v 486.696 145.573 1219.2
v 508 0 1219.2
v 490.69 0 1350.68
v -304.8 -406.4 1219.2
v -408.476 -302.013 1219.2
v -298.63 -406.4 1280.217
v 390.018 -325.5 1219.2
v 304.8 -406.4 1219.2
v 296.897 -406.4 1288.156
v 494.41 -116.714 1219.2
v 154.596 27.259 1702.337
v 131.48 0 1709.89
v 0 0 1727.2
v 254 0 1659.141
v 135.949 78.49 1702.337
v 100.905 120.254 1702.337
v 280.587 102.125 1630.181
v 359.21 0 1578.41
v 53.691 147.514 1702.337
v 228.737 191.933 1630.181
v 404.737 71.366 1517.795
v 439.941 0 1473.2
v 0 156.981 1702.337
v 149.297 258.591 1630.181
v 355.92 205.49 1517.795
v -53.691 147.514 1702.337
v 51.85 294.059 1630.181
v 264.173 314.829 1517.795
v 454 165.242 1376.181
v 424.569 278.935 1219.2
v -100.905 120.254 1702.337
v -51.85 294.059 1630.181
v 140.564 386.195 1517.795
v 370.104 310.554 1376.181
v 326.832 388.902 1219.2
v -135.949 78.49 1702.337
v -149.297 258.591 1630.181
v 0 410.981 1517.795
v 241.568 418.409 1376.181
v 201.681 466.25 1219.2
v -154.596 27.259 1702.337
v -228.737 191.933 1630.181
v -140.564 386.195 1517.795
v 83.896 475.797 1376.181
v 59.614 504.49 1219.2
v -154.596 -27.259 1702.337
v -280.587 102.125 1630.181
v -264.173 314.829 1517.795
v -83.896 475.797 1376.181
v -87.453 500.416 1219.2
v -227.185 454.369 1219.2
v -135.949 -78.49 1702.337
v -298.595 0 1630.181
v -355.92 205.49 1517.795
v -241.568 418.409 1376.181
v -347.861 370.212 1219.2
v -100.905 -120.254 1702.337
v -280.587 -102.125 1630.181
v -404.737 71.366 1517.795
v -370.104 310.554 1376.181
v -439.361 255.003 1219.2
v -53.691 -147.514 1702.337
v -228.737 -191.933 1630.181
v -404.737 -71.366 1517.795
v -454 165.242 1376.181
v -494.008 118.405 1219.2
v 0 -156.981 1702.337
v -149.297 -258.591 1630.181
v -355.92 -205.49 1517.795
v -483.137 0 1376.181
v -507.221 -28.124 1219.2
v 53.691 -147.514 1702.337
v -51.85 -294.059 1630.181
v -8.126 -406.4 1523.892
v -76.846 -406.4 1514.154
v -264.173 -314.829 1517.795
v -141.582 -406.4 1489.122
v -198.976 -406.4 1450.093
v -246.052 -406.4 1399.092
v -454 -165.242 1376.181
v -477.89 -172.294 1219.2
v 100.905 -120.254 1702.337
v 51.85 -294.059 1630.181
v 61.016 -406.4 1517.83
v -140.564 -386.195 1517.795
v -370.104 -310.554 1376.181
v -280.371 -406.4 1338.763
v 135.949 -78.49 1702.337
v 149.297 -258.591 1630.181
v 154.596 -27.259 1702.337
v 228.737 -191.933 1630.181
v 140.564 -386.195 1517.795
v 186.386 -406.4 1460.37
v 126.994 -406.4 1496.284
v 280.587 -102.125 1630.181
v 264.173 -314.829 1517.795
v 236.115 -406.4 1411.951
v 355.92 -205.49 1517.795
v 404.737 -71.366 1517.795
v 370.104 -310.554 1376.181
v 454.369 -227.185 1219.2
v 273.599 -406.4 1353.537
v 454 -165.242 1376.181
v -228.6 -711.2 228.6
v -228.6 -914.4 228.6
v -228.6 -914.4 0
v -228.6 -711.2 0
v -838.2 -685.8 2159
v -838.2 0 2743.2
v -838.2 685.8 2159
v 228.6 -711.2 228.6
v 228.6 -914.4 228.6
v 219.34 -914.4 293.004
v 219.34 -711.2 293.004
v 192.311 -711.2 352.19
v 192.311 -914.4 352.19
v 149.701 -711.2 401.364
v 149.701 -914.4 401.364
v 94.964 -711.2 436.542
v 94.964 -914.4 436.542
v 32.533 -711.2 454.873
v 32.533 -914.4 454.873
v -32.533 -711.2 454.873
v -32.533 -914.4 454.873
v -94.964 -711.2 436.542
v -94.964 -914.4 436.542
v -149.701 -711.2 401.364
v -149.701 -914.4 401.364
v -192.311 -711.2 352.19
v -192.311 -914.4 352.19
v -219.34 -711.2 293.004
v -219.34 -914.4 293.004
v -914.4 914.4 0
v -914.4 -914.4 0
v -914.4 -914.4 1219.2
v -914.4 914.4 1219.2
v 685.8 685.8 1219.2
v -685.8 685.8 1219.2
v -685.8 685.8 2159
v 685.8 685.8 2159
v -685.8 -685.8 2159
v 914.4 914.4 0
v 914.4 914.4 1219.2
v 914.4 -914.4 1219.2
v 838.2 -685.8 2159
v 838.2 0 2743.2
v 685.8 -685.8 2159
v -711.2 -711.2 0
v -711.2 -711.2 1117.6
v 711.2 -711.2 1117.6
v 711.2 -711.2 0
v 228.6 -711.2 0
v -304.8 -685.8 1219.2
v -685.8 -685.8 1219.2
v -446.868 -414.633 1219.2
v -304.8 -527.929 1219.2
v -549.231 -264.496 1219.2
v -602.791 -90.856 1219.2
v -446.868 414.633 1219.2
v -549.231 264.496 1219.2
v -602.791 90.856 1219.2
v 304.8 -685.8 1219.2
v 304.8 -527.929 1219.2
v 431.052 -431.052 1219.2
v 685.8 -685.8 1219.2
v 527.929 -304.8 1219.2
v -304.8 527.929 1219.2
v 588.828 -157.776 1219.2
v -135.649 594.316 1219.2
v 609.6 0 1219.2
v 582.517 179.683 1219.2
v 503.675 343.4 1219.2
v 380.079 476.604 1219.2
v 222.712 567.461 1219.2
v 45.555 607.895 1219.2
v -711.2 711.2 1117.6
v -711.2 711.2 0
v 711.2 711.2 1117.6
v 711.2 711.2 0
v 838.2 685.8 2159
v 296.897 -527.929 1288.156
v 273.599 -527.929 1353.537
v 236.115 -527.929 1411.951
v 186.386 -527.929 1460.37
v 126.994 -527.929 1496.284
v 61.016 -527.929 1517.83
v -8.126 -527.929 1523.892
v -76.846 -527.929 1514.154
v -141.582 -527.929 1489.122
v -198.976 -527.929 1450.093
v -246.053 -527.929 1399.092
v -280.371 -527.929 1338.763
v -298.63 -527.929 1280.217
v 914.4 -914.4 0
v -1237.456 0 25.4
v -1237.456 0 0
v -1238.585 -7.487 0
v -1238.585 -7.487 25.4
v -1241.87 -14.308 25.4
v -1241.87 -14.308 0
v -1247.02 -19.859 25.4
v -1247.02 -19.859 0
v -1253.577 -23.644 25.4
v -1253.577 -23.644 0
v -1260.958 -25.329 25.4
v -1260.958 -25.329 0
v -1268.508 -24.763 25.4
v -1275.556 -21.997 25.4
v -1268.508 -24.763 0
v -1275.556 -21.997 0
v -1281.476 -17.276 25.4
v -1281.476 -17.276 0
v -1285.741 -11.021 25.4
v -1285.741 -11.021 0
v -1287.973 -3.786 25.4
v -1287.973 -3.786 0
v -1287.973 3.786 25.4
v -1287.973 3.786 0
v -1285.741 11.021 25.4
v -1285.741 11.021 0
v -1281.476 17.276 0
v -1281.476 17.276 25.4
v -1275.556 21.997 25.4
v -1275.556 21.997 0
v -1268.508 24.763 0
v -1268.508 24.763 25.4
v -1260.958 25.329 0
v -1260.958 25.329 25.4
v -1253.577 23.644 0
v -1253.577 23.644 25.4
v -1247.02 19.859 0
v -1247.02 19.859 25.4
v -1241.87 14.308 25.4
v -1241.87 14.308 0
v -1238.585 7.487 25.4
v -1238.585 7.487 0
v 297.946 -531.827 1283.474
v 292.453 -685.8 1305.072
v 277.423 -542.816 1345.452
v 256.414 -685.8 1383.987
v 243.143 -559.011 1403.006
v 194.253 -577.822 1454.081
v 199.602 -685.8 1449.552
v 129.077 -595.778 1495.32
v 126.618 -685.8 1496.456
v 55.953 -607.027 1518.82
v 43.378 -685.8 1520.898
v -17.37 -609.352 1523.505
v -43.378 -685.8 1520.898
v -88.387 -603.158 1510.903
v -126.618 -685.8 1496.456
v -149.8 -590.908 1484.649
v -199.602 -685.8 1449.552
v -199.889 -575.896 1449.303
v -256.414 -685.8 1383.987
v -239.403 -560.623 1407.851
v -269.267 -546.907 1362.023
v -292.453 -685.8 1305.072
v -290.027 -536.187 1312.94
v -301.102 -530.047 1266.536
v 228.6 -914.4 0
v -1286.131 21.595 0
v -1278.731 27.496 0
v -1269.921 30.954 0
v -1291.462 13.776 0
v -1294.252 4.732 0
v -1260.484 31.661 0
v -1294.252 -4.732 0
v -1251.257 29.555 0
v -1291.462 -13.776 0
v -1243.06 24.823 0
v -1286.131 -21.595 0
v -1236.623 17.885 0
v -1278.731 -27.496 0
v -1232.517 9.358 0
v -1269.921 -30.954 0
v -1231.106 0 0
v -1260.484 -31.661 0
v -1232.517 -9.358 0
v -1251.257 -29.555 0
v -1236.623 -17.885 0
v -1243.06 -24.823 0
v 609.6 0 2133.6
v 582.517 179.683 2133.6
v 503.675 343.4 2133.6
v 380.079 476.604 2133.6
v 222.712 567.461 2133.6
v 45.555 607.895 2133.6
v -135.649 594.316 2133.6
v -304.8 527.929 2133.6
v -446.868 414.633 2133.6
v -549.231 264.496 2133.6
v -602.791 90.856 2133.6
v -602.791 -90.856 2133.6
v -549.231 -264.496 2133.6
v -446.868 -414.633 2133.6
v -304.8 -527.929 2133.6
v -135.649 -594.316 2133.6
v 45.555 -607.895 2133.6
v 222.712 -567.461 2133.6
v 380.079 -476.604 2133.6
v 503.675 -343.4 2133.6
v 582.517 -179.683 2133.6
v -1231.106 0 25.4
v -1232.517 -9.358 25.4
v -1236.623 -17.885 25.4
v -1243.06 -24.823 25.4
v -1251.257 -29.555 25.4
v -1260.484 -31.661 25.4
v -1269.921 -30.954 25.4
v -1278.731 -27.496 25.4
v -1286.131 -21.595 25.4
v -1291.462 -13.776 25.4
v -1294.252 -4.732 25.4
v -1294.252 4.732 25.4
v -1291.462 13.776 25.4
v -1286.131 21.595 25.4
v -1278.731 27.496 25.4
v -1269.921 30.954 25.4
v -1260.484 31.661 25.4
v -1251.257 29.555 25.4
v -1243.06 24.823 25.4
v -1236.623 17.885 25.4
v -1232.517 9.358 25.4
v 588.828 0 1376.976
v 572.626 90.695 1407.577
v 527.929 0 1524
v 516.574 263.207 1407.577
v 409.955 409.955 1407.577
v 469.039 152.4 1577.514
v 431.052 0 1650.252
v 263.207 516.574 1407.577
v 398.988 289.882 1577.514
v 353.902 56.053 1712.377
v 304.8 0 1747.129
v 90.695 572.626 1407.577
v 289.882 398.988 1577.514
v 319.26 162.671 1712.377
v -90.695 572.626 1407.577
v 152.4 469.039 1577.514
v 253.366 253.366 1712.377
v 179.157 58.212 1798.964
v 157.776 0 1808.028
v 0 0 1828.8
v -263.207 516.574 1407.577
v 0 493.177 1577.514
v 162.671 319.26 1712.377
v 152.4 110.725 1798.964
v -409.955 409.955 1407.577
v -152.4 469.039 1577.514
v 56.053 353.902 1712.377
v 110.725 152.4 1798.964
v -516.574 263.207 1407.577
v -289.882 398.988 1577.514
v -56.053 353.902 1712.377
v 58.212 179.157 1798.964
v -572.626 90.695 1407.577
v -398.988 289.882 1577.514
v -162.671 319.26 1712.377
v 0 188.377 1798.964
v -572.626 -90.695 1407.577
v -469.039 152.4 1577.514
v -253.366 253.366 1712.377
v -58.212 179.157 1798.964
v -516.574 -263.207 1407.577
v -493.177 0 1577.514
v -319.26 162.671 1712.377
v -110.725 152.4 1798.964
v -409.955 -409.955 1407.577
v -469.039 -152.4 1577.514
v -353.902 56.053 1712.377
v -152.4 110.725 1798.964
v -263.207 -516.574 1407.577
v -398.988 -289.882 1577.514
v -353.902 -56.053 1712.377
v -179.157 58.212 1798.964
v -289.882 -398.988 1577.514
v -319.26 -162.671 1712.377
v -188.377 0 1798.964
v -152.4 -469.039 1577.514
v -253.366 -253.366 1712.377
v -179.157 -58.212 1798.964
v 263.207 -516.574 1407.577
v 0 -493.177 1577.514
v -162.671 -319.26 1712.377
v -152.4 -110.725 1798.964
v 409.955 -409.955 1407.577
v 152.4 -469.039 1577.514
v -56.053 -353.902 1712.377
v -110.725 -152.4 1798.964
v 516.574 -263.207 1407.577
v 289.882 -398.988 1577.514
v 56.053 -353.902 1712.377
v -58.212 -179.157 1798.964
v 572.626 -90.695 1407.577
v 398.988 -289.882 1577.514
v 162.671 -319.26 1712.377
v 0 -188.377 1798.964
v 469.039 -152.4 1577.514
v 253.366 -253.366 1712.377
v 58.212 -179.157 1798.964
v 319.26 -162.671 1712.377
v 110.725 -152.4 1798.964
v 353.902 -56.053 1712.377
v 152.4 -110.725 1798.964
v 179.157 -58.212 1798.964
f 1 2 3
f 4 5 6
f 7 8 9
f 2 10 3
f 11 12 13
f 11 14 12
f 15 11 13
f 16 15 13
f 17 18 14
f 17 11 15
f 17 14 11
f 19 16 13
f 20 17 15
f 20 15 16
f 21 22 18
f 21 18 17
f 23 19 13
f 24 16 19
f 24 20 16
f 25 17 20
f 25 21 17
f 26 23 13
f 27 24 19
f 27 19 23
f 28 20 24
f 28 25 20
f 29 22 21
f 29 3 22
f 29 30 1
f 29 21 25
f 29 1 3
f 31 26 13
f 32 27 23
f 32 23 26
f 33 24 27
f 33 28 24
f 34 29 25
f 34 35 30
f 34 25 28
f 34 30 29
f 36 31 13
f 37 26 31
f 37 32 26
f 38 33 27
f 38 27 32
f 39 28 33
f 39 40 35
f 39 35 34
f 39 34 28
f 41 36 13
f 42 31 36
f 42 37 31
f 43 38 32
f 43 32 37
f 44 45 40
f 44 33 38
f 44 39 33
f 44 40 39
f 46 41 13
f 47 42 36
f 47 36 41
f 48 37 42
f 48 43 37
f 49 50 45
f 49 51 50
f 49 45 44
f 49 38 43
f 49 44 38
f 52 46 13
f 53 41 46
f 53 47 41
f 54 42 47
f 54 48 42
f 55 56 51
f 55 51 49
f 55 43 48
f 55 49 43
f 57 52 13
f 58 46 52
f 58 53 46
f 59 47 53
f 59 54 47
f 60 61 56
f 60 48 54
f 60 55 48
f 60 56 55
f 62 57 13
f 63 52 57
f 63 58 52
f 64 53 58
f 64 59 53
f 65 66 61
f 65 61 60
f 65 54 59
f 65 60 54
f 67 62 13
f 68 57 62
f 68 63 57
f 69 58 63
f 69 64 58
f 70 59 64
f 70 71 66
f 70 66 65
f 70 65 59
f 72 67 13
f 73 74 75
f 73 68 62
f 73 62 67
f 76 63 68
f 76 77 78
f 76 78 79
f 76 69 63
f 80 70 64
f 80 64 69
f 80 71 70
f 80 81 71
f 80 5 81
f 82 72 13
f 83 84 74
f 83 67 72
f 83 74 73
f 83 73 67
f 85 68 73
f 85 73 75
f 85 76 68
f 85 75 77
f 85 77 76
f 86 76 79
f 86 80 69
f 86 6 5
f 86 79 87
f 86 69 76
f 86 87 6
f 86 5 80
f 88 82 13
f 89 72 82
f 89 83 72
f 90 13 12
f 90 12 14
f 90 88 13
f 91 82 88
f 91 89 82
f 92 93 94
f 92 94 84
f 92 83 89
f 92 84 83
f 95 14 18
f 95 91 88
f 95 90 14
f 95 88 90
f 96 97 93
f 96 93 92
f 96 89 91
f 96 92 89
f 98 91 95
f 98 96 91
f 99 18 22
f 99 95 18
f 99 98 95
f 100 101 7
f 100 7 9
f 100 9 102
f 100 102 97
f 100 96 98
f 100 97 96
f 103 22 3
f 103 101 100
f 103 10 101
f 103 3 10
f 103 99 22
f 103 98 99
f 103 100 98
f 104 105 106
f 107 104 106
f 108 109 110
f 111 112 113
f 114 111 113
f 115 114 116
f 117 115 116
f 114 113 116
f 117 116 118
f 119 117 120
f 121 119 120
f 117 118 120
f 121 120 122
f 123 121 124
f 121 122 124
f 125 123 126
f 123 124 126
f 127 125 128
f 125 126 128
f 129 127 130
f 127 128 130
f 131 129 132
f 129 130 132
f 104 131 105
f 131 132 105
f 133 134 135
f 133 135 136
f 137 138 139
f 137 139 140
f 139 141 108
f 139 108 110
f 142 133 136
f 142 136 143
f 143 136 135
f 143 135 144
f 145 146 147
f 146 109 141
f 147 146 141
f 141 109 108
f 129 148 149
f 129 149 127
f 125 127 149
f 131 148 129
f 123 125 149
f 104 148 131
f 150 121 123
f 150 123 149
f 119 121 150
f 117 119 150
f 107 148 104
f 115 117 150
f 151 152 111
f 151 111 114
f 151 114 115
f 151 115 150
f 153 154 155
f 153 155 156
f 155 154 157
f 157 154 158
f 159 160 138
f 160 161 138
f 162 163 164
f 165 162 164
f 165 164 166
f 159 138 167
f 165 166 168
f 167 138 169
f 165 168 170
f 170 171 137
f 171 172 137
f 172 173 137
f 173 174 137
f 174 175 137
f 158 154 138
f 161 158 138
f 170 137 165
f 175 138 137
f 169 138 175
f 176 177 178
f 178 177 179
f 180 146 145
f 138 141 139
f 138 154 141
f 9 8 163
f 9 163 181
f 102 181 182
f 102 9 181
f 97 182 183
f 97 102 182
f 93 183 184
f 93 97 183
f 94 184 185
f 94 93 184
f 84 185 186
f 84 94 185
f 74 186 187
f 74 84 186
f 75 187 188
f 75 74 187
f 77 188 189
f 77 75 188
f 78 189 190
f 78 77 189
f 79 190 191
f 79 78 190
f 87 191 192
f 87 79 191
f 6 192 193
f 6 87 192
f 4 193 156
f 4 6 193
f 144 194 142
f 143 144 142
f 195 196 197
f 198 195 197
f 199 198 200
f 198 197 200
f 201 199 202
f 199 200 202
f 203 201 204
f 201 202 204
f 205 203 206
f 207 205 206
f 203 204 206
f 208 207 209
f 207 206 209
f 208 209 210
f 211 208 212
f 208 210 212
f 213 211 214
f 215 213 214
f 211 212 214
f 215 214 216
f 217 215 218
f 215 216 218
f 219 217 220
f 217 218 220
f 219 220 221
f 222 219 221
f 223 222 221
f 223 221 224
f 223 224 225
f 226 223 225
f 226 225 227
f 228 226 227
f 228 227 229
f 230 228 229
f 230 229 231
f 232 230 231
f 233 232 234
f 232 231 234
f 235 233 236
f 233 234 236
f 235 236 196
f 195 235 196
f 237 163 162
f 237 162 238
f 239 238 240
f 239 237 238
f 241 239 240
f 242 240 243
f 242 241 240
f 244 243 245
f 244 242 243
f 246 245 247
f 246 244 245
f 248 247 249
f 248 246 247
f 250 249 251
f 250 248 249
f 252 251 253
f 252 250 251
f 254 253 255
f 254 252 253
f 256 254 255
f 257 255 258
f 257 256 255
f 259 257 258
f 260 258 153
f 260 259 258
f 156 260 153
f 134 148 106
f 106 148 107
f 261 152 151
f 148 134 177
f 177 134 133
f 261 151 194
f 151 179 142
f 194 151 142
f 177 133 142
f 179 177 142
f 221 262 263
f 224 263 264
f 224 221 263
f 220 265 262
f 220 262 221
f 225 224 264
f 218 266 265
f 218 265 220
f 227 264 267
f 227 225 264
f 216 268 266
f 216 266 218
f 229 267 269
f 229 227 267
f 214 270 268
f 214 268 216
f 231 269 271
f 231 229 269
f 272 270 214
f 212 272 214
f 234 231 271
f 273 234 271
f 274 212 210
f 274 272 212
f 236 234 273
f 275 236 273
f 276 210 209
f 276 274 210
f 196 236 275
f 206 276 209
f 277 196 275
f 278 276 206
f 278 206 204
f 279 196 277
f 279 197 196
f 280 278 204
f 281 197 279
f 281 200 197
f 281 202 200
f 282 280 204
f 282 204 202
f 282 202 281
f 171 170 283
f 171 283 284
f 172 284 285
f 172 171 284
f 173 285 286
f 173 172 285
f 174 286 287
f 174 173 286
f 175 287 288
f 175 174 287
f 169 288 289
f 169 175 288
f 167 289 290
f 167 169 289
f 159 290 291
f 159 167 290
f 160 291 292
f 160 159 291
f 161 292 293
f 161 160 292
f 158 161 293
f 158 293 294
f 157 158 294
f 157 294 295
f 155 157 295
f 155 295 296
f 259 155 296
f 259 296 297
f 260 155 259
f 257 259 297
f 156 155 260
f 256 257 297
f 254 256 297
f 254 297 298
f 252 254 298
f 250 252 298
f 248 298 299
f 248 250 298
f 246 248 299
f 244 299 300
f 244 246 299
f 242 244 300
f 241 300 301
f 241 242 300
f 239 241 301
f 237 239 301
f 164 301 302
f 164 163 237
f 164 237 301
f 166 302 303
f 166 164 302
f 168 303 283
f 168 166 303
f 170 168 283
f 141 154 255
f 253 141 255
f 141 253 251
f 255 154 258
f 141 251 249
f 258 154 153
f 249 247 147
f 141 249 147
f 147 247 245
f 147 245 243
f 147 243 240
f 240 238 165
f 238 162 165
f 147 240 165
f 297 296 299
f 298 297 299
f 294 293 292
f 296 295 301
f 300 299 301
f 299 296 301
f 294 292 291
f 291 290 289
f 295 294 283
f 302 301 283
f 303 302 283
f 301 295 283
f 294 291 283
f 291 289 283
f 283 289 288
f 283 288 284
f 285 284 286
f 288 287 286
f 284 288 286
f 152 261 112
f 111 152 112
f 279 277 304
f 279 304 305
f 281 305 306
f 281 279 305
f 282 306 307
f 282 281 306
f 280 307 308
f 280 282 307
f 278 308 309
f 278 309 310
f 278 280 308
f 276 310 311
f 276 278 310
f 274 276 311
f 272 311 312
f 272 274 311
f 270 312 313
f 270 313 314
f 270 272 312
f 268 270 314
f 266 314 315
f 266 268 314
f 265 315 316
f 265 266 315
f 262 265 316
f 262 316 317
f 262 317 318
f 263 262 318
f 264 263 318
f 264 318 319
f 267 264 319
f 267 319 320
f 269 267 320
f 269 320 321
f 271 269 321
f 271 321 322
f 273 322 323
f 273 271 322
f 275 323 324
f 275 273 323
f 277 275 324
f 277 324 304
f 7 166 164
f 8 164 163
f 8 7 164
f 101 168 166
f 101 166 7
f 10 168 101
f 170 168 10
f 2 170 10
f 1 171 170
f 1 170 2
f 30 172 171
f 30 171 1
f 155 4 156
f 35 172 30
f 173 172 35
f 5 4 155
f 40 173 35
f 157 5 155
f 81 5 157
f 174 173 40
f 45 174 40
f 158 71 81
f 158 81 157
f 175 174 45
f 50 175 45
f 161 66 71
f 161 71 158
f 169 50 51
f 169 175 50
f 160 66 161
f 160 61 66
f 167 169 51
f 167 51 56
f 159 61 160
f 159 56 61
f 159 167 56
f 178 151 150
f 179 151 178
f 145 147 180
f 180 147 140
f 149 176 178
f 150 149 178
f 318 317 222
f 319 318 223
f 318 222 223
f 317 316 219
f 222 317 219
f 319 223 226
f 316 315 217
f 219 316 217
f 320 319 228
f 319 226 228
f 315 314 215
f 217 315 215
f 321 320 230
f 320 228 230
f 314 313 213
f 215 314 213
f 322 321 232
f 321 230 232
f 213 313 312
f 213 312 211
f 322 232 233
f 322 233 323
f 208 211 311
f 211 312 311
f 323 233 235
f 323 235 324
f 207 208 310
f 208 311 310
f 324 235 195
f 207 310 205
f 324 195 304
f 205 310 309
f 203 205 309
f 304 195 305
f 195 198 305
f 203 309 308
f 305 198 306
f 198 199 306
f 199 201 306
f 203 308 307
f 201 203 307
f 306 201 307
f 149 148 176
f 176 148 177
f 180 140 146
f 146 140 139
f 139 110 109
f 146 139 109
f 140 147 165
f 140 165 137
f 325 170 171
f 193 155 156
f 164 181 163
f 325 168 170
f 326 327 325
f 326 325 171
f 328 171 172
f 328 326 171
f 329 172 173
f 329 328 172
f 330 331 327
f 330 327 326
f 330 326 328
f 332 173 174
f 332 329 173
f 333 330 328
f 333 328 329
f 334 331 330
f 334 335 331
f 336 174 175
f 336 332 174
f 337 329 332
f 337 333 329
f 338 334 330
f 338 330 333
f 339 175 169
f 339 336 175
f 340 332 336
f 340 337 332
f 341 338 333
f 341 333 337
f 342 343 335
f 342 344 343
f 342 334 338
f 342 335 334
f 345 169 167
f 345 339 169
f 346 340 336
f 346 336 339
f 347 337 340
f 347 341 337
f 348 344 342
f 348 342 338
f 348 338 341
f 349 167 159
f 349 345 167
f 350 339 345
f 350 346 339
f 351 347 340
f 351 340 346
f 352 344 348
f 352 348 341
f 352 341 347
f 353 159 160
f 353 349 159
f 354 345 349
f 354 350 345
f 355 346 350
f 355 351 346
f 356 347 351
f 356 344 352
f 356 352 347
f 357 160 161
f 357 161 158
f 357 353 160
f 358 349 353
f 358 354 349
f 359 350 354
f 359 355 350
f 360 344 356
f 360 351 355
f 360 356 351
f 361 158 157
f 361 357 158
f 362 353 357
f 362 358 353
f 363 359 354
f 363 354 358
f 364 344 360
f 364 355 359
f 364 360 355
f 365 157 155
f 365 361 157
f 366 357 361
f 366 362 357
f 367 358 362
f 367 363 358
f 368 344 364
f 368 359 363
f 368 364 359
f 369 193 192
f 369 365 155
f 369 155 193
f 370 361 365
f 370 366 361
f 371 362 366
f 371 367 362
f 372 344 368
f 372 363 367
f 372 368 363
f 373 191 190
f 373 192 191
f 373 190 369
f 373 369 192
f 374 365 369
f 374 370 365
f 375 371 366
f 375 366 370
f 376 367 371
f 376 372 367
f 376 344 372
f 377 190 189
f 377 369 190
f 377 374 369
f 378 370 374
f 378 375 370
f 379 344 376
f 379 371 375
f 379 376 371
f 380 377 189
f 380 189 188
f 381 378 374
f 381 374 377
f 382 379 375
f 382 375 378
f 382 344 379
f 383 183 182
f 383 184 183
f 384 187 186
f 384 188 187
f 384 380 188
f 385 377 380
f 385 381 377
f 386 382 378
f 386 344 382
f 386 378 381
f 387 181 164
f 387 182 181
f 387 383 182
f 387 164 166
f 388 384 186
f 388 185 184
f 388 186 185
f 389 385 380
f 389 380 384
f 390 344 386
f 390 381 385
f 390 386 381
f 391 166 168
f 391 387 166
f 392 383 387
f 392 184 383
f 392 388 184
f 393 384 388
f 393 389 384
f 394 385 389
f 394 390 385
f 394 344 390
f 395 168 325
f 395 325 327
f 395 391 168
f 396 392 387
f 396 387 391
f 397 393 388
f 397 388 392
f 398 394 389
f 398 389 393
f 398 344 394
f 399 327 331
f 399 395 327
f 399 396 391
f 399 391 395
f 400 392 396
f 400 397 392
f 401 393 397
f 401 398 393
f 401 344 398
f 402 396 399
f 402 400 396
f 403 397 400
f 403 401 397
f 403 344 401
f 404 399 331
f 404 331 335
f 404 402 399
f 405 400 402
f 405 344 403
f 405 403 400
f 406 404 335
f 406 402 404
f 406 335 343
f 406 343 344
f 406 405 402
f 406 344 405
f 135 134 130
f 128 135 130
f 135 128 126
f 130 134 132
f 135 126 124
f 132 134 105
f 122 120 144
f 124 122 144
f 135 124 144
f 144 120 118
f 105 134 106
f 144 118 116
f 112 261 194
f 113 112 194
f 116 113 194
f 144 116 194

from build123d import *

# Parameters (mm, degrees)
F0_W           = 1828.8
F0_H           = 1828.8
F0_W_2         = 1422.4
F0_H_2         = 1422.4
F1_DEPTH       = 1219.2
F2_W           = 1371.6
F2_H           = 1371.6
F2_R           = 609.6
F5_DEPTH       = 914.4
F6_W           = 1371.6
F6_H           = 1371.6
F7_DEPTH       = 25.4
F9_W           = 1422.4
F9_H           = 1422.4
F10_DEPTH      = 101.6
F11_DEPTH      = 203.2
F13_DEPTH      = 1524
F13_DEPTH_BACK = 152.4
F15_DEPTH      = 304.8
F15_DEPTH_BACK = 228.601
F16_R          = 31.75
F16_R_2        = 25.4
F17_DEPTH      = 25.4


with BuildPart() as f1:
    # F0 (on Top) → F1 (new body)
    with BuildSketch(Plane.XY):
        Rectangle(F0_W, F0_H)
        Rectangle(F0_W_2, F0_H_2, mode=Mode.SUBTRACT)
    extrude(amount=F1_DEPTH)

    # F9 (on face) → F10 (join)
    with BuildSketch(Plane.XY.offset(1219.2)):
        Rectangle(F9_W, F9_H)
    extrude(amount=-F10_DEPTH)

    # F8 (on face) → F11 (cut, through all)
    with BuildSketch(Plane.XZ.offset(914.4)):
        with BuildLine():
            Line((228.6, 0), (228.6, 228.6))
            ThreePointArc((228.6, 228.6), (0, 457.2), (-228.6, 228.6))
            Line((-228.6, 228.6), (-228.6, 0))
            Line((-228.6, 0), (228.6, 0))
        make_face()
    extrude(amount=-F11_DEPTH, mode=Mode.SUBTRACT)


with BuildPart() as f4:
    # F3 (on Front) → F4 (revolve)
    with BuildSketch(Plane.XZ):
        with BuildLine():
            Line((508, 1219.2), (609.6, 1219.2))
            ThreePointArc((609.6, 1219.2), (431.0522938113, 1650.2522938113), (0, 1828.8))
            Line((0, 1828.8), (0, 1727.2))
            ThreePointArc((0, 1727.2), (359.2102448428, 1578.4102448428), (508, 1219.2))
        make_face()
    revolve(axis=Axis((0, 0, 1524), (0, 0, 1)))


with BuildPart() as f5:
    # F2 (on face) → F5 (new body)
    with BuildSketch(Plane.XY.offset(1219.2)):
        Rectangle(F2_W, F2_H)
        Circle(F2_R, mode=Mode.SUBTRACT)
    extrude(amount=F5_DEPTH)

    # F6 (on face) → F7 (join)
    with BuildSketch(Plane.XY.offset(2133.6)):
        Rectangle(F6_W, F6_H)
    extrude(amount=F7_DEPTH)

    # F12 (on face) → F13 (join, two sides)
    with BuildSketch(Plane.YZ.offset(685.8)) as f13_sk:
        Polygon((0, 2743.2), (-685.8, 2159), (685.8, 2159), align=None)
    extrude(amount=-F13_DEPTH)
    extrude(f13_sk.sketch, amount=F13_DEPTH_BACK)


with BuildPart() as f15_tool:
    # F14 (on face) → F15 (new body, two sides)
    with BuildSketch(Plane.XZ.offset(685.8)) as f15_sk:
        with BuildLine():
            Line((-304.8, 1219.2), (304.8, 1219.2))
            ThreePointArc((304.8, 1219.2), (0, 1524), (-304.8, 1219.2))
        make_face()
    extrude(amount=-F15_DEPTH)
    extrude(f15_sk.sketch, amount=F15_DEPTH_BACK)


with BuildPart() as f4_1:
    add(f4.part)

    # F15: cut by f15_tool
    add(f15_tool.part, mode=Mode.SUBTRACT)


with BuildPart() as f5_1:
    add(f5.part)

    # F15: cut by f15_tool
    add(f15_tool.part, mode=Mode.SUBTRACT)


with BuildPart() as f17:
    # F16 (on face) → F17 (new body)
    with BuildSketch(Plane(origin=(0, 0, 0), x_dir=(1, 0, 0), z_dir=(0, 0, -1))):
        with Locations((-1262.85625, 0)):
            Circle(F16_R)
        with Locations((-1262.85625, 0)):
            Circle(F16_R_2, mode=Mode.SUBTRACT)
    extrude(amount=-F17_DEPTH)


solid = Compound([f1.part, f4_1.part, f5_1.part, f17.part])
